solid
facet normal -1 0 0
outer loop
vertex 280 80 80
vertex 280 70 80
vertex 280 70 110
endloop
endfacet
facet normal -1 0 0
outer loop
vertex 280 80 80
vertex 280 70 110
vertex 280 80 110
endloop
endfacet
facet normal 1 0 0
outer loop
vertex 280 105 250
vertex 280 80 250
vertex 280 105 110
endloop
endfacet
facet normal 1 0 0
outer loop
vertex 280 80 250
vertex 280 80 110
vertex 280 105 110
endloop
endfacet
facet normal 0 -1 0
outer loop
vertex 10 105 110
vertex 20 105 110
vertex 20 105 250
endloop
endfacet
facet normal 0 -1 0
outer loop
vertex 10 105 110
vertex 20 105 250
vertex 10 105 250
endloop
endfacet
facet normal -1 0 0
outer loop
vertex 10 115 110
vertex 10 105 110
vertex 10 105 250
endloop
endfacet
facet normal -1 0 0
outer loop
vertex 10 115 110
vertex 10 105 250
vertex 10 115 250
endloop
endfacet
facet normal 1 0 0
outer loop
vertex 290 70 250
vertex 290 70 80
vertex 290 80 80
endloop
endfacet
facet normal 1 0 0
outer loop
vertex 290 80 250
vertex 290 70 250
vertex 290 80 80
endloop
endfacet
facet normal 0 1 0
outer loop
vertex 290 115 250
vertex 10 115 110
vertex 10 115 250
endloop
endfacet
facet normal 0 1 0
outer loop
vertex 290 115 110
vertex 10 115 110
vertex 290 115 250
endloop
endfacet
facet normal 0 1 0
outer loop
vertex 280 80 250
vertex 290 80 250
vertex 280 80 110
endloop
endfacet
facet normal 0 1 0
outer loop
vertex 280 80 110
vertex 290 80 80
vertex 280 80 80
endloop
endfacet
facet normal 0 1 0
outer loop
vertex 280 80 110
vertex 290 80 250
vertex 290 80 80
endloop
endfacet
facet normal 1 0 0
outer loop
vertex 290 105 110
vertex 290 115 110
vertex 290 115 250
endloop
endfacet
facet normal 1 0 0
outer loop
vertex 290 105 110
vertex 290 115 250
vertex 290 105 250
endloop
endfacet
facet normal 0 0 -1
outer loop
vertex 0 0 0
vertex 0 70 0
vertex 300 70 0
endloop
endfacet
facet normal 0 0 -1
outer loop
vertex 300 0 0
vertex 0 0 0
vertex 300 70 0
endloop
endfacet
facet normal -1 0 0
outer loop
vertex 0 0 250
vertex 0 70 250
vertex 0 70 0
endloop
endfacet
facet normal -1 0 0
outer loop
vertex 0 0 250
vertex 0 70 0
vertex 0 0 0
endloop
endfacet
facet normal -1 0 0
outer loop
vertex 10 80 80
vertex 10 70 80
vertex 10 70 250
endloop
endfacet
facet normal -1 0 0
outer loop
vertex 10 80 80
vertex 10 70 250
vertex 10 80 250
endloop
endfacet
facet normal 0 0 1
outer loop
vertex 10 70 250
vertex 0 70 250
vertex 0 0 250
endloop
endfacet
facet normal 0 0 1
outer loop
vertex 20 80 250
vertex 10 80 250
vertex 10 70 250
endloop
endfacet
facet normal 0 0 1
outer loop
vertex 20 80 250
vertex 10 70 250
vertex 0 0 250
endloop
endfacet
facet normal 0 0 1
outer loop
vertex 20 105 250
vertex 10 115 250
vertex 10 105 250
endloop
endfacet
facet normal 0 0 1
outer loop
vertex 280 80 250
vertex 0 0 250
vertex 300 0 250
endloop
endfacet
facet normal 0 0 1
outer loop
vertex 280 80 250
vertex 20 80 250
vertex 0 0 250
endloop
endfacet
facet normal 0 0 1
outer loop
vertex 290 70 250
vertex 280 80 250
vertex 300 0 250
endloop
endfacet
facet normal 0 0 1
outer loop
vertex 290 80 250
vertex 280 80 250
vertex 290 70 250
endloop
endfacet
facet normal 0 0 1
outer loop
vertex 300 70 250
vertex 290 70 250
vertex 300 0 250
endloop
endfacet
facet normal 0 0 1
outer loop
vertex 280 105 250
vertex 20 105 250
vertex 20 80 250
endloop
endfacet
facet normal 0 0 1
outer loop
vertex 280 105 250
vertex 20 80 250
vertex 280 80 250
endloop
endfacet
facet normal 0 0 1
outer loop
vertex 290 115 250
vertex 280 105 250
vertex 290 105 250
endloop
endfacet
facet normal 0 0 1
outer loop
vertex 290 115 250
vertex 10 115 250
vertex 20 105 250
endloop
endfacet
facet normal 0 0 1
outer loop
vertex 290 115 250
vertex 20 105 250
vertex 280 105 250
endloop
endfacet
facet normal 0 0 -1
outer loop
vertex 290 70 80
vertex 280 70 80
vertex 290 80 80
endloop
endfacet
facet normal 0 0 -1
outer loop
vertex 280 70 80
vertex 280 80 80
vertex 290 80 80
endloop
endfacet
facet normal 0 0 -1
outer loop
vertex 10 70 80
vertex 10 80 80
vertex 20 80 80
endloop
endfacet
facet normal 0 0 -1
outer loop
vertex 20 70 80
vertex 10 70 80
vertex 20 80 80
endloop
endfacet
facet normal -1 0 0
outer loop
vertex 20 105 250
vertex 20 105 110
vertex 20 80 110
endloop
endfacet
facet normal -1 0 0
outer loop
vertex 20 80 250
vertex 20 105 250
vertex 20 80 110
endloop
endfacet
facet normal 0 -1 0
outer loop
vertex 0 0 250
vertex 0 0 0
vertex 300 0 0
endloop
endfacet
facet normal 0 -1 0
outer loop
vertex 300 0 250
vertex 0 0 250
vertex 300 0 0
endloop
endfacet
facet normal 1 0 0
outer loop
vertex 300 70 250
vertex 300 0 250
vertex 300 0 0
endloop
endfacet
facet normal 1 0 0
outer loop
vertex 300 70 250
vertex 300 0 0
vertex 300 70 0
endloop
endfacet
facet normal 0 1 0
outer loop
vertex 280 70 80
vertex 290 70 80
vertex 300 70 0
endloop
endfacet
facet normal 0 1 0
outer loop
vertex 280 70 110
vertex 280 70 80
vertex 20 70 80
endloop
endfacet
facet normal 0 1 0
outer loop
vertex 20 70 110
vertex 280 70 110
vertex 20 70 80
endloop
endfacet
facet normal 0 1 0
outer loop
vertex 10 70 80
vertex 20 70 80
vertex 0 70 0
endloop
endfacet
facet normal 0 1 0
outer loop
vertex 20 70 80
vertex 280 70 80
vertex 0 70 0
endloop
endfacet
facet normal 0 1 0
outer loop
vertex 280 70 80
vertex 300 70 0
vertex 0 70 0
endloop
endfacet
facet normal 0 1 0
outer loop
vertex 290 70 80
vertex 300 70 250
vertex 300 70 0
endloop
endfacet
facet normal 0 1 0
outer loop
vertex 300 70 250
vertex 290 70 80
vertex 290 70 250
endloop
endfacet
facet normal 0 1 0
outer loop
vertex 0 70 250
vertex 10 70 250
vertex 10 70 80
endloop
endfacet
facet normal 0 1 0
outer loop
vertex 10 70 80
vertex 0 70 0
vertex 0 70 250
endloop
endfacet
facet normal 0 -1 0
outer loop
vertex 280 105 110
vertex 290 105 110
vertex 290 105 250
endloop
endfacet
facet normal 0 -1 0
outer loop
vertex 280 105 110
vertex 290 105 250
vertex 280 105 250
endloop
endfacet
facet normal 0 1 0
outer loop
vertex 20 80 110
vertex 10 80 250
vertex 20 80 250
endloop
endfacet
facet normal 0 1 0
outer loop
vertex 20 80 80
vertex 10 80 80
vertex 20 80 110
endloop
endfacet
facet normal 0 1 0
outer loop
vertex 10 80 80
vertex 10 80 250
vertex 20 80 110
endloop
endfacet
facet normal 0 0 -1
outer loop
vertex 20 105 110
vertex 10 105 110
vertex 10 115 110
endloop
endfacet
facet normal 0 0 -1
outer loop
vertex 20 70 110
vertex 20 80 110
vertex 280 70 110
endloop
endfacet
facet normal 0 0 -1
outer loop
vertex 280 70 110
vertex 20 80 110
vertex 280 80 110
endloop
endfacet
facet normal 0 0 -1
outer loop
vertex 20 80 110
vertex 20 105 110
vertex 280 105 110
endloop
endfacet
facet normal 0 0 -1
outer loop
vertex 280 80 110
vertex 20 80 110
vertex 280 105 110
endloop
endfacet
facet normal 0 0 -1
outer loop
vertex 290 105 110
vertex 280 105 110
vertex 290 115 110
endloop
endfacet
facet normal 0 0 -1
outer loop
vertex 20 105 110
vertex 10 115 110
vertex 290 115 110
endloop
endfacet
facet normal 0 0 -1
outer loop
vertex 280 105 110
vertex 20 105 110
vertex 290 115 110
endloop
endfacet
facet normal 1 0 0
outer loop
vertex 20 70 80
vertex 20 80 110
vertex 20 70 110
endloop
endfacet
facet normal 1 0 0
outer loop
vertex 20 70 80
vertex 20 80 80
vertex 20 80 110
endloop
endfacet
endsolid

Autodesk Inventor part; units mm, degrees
ref_plane "YZ Plane" through (0, 0, 0) normal (1, 0, 0) x (0, 1, 0)
ref_plane "XZ Plane" through (0, 0, 0) normal (0, 1, 0) x (-1, 0, 0)
ref_plane "XY Plane" through (0, 0, 0) normal (0, 0, 1) x (1, 0, 0)
sketch "스케치1" plane through (0, 0, 0) normal (0, 0, 1) x (1, 0, 0)
  line L0 (0, 0) -> (300, 0)
  line L1 (300, 0) -> (300, 70)
  line L2 (300, 70) -> (280, 70)
  line L3 (280, 70) -> (280, 105)
  line L4 (20, 105) -> (20, 70)
  line L5 (20, 70) -> (0, 70)
  line L6 (0, 70) -> (0, 0)
  line L7 (20, 105) -> (10, 105)
  line L8 (10, 105) -> (10, 115)
  line L9 (10, 115) -> (290, 115)
  line L10 (290, 115) -> (290, 105)
  line L11 (290, 105) -> (280, 105)
  line L12 (20, 70) -> (280, 70)
  line L13 (10, 70) -> (10, 80)
  line L14 (10, 80) -> (20, 80)
  line L15 (150, 115) -> (150, 100)
  line L16 (290, 70) -> (290, 80)
  line L17 (290, 80) -> (280, 80)
  point P0 (150, 0)
  dimension "d0" = 300
  dimension "d1" = 70
  dimension "d2" = 35
  dimension "d3" = 20
  dimension "d4" = 10
  dimension "d5" = 10
  dimension "d10" = 10
extrude "돌출1" add sketch "스케치1" along normal blind 250
extrude "돌출2" cut sketch "스케치1" along normal blind 110 contours L4 L7 L8 L9 L10 L11 L3 L12
extrude "돌출3" cut sketch "스케치1" along normal blind 80 contours L13 L14 L4 L5 | L2 L3 L17 L16
properties part number "DummyModule"
